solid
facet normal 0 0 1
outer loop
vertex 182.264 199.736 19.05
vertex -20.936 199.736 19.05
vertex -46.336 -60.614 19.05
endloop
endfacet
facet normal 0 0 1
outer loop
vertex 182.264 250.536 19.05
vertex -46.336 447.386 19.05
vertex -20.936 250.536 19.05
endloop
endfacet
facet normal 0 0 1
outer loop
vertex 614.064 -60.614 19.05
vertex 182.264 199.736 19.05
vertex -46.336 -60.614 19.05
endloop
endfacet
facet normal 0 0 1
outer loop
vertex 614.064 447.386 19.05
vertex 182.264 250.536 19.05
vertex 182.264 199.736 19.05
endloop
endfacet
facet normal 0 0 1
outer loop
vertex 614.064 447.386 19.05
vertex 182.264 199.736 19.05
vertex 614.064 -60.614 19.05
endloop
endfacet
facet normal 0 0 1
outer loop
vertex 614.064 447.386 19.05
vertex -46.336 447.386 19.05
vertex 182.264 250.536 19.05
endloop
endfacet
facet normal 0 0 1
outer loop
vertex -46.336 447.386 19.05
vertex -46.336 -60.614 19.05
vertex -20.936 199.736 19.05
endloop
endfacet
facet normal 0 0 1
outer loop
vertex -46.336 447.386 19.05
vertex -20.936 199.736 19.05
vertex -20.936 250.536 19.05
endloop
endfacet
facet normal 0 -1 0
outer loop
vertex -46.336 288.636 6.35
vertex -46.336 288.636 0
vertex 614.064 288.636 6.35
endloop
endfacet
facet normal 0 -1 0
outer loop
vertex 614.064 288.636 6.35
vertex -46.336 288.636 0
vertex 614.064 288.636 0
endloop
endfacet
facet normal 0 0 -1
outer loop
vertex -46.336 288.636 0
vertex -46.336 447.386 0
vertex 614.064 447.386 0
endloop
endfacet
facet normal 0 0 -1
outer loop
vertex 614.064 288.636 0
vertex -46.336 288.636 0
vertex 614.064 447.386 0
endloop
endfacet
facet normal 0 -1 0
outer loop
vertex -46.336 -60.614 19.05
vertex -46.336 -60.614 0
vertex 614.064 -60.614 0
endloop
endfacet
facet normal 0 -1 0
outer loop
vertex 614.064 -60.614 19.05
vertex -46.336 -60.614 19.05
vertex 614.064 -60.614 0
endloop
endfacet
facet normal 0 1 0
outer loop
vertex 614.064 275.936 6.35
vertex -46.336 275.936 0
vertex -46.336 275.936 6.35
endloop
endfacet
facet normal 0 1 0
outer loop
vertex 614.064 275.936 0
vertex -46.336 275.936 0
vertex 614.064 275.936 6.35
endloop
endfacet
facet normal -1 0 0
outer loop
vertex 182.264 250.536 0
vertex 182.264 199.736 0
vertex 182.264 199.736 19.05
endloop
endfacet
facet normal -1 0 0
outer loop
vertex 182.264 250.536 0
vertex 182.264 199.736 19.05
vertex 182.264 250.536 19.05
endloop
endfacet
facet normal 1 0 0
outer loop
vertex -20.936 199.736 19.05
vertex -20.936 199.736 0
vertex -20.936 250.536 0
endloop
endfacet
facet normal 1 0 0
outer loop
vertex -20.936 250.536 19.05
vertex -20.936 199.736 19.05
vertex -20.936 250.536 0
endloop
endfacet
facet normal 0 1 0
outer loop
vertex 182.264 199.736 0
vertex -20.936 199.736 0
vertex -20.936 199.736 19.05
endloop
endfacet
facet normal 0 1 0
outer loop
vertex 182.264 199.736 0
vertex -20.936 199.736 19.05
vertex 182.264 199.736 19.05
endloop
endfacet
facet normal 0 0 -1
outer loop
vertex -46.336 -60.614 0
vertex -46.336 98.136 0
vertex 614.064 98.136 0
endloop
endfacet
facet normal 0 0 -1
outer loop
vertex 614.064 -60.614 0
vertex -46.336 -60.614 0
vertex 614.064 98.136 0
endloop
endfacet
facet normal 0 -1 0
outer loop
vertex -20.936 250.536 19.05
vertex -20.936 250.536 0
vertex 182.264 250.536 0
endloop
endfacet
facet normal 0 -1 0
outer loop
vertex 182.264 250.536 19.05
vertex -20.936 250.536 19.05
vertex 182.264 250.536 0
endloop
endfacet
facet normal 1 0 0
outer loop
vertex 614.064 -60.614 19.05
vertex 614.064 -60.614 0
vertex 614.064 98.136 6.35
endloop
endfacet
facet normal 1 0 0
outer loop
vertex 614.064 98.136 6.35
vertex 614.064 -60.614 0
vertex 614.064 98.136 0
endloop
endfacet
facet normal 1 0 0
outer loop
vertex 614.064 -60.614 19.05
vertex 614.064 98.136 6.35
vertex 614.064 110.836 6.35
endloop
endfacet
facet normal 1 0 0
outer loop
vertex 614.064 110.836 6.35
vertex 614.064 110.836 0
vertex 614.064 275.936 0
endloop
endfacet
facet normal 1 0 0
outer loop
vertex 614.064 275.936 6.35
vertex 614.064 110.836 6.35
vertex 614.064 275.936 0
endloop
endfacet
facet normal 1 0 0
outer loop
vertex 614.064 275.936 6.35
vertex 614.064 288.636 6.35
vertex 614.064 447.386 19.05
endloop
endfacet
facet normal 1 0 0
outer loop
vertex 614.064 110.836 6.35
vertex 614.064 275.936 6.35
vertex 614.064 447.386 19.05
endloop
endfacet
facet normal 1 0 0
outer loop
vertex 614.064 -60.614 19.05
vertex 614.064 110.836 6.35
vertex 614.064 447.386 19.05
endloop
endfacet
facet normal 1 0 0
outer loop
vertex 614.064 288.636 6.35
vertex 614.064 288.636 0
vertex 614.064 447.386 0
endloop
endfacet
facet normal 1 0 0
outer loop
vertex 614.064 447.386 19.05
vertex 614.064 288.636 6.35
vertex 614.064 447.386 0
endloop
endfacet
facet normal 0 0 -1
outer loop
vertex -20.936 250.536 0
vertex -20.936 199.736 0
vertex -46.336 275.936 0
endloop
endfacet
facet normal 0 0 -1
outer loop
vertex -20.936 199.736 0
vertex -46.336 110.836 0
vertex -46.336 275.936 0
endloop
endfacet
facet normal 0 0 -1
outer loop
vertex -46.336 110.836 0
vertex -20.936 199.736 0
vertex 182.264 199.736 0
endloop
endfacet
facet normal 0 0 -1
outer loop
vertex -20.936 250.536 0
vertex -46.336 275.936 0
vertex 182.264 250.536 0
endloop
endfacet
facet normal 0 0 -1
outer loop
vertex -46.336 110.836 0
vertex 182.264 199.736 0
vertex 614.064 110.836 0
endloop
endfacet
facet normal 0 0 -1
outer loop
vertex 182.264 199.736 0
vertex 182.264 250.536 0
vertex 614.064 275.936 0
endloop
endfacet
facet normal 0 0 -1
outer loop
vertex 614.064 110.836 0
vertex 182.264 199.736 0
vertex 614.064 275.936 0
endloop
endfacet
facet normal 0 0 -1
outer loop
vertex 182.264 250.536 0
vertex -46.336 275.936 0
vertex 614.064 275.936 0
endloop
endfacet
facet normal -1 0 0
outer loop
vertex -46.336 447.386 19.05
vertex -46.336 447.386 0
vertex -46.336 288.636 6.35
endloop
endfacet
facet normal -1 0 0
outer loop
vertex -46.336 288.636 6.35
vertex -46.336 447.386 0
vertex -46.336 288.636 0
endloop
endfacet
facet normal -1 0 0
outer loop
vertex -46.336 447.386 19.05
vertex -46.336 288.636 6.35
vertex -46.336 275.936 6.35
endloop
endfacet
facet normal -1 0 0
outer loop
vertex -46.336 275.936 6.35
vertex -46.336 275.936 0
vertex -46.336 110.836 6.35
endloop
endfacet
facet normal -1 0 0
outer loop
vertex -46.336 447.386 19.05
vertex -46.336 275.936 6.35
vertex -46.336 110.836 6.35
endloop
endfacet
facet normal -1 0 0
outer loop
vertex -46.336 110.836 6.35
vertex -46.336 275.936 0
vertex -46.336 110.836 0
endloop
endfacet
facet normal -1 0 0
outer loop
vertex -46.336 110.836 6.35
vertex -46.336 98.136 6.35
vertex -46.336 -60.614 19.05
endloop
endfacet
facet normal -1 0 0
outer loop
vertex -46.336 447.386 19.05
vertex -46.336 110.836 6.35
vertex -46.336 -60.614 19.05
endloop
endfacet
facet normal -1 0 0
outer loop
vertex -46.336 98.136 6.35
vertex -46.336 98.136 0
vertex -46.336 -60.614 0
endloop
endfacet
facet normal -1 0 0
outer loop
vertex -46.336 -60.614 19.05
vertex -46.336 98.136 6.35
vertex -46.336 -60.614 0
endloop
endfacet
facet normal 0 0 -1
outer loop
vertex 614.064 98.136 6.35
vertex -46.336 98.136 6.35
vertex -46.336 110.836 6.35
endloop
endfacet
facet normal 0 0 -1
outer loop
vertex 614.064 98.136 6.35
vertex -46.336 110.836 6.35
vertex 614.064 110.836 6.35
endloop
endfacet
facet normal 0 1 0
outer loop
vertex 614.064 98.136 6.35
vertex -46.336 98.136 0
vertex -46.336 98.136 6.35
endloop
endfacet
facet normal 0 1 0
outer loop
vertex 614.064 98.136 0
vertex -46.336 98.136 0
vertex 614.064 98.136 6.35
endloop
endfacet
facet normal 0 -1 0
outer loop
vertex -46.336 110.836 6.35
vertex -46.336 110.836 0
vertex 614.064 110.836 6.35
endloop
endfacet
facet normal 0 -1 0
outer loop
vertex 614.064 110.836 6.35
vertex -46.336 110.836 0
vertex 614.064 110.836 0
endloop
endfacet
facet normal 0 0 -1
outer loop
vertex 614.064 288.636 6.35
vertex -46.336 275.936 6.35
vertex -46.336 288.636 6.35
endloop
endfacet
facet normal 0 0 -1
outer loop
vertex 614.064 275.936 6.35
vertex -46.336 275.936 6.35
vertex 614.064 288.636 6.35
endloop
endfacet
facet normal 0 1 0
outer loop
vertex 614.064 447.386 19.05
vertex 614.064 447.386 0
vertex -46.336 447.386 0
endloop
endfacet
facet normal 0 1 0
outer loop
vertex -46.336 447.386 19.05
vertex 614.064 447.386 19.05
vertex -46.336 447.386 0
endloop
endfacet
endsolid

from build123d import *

# Parameters (mm, degrees)
F0_W     = 203.2
F0_H     = 50.8
F1_DEPTH = 19.05
F2_W     = 660.4
F2_H     = 12.699998945
F2_H_2   = 12.6999986589
F3_DEPTH = 6.35


# Not quite as in the source:
# - a feature names something its author has since deleted; it is built from what else it names


with BuildPart() as f1:
    # F0 (on Top) → F1 (new body)
    with BuildSketch(Plane.XY):
        Polygon((614.0642432213, 447.3863640726), (-46.3357567787, 447.3863640726), (-46.3357567787, -60.6136359274), (614.0642432213, -60.6136359274), (614.0642432213, -28.8636359274), (614.0642432213, -9.8136359274), (614.0642432213, 396.5863640726), (614.0642432213, 415.6363640726), align=None)
        with Locations((80.6642432213, 225.1363640726)):
            Rectangle(F0_W, F0_H, mode=Mode.SUBTRACT)
    extrude(amount=F1_DEPTH)

    # F2 (on face) → F3 (cut)
    with BuildSketch(Plane(origin=(0, 0, 0), x_dir=(1, 0, 0), z_dir=(0, 0, -1))):
        with Locations((283.8642432213, -282.2863646001)):
            Rectangle(F2_W, F2_H)
        with Locations((283.8642432213, -104.4863647431)):
            Rectangle(F2_W, F2_H_2)
    extrude(amount=-F3_DEPTH, mode=Mode.SUBTRACT)


solid = f1.part
